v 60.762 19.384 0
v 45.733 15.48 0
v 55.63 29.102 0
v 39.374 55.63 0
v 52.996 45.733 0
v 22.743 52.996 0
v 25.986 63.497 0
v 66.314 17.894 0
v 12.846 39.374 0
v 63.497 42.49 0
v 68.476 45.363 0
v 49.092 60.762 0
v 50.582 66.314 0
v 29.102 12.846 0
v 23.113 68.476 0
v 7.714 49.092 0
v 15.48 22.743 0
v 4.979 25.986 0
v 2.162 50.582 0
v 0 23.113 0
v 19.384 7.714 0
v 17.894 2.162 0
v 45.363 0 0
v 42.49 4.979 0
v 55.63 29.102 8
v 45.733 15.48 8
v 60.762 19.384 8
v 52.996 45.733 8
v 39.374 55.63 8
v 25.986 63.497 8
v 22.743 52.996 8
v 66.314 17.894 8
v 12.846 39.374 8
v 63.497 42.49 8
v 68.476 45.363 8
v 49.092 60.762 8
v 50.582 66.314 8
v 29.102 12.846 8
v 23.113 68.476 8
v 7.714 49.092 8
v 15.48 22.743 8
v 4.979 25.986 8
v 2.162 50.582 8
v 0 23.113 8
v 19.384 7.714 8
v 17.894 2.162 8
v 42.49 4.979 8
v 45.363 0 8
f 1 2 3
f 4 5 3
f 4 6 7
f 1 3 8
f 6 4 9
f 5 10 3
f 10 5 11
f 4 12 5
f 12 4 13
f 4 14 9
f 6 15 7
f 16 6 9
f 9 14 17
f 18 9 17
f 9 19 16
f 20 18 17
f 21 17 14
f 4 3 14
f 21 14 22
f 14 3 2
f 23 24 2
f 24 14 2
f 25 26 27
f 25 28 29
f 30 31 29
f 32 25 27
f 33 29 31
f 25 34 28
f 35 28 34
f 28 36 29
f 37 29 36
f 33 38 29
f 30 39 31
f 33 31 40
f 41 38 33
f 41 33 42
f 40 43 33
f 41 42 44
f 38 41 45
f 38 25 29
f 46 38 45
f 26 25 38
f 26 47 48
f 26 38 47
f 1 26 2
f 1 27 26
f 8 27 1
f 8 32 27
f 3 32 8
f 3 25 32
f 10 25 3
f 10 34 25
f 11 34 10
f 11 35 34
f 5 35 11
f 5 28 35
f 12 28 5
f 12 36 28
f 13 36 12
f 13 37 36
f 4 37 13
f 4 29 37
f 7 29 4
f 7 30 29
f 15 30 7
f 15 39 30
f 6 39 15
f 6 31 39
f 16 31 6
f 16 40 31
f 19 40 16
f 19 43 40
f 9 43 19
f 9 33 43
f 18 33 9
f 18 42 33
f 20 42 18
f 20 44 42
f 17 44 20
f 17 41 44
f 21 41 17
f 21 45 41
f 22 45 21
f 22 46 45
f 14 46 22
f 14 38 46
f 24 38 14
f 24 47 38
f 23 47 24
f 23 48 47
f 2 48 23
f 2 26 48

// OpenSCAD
$fn = 32;

// ----------------------------------------------------------------------
// Fan rotor section: 8 blades, 22 mm hub radius, 14 mm blades
// ----------------------------------------------------------------------

// --- parameters (mm) ---
profile_height = 8;       // extrusion height
profile_points = 24;      // points of the closed outline

profile = [[55.63, 29.102], [63.497, 42.49], [68.476, 45.363], [52.996, 45.733], [49.092, 60.762], [50.582, 66.314], [39.374, 55.63], [25.986, 63.497], [23.113, 68.476], [22.743, 52.996], [7.714, 49.092], [2.162, 50.582], [12.846, 39.374], [4.979, 25.986], [0, 23.113], [15.48, 22.743], [19.384, 7.714], [17.894, 2.162], [29.102, 12.846], [42.49, 4.979], [45.363, 0], [45.733, 15.48], [60.762, 19.384], [66.314, 17.894]];  // single closed polygon, 24 points, counter clockwise

// --- the one profile operation ---
linear_extrude(height = profile_height) polygon(points = profile);
